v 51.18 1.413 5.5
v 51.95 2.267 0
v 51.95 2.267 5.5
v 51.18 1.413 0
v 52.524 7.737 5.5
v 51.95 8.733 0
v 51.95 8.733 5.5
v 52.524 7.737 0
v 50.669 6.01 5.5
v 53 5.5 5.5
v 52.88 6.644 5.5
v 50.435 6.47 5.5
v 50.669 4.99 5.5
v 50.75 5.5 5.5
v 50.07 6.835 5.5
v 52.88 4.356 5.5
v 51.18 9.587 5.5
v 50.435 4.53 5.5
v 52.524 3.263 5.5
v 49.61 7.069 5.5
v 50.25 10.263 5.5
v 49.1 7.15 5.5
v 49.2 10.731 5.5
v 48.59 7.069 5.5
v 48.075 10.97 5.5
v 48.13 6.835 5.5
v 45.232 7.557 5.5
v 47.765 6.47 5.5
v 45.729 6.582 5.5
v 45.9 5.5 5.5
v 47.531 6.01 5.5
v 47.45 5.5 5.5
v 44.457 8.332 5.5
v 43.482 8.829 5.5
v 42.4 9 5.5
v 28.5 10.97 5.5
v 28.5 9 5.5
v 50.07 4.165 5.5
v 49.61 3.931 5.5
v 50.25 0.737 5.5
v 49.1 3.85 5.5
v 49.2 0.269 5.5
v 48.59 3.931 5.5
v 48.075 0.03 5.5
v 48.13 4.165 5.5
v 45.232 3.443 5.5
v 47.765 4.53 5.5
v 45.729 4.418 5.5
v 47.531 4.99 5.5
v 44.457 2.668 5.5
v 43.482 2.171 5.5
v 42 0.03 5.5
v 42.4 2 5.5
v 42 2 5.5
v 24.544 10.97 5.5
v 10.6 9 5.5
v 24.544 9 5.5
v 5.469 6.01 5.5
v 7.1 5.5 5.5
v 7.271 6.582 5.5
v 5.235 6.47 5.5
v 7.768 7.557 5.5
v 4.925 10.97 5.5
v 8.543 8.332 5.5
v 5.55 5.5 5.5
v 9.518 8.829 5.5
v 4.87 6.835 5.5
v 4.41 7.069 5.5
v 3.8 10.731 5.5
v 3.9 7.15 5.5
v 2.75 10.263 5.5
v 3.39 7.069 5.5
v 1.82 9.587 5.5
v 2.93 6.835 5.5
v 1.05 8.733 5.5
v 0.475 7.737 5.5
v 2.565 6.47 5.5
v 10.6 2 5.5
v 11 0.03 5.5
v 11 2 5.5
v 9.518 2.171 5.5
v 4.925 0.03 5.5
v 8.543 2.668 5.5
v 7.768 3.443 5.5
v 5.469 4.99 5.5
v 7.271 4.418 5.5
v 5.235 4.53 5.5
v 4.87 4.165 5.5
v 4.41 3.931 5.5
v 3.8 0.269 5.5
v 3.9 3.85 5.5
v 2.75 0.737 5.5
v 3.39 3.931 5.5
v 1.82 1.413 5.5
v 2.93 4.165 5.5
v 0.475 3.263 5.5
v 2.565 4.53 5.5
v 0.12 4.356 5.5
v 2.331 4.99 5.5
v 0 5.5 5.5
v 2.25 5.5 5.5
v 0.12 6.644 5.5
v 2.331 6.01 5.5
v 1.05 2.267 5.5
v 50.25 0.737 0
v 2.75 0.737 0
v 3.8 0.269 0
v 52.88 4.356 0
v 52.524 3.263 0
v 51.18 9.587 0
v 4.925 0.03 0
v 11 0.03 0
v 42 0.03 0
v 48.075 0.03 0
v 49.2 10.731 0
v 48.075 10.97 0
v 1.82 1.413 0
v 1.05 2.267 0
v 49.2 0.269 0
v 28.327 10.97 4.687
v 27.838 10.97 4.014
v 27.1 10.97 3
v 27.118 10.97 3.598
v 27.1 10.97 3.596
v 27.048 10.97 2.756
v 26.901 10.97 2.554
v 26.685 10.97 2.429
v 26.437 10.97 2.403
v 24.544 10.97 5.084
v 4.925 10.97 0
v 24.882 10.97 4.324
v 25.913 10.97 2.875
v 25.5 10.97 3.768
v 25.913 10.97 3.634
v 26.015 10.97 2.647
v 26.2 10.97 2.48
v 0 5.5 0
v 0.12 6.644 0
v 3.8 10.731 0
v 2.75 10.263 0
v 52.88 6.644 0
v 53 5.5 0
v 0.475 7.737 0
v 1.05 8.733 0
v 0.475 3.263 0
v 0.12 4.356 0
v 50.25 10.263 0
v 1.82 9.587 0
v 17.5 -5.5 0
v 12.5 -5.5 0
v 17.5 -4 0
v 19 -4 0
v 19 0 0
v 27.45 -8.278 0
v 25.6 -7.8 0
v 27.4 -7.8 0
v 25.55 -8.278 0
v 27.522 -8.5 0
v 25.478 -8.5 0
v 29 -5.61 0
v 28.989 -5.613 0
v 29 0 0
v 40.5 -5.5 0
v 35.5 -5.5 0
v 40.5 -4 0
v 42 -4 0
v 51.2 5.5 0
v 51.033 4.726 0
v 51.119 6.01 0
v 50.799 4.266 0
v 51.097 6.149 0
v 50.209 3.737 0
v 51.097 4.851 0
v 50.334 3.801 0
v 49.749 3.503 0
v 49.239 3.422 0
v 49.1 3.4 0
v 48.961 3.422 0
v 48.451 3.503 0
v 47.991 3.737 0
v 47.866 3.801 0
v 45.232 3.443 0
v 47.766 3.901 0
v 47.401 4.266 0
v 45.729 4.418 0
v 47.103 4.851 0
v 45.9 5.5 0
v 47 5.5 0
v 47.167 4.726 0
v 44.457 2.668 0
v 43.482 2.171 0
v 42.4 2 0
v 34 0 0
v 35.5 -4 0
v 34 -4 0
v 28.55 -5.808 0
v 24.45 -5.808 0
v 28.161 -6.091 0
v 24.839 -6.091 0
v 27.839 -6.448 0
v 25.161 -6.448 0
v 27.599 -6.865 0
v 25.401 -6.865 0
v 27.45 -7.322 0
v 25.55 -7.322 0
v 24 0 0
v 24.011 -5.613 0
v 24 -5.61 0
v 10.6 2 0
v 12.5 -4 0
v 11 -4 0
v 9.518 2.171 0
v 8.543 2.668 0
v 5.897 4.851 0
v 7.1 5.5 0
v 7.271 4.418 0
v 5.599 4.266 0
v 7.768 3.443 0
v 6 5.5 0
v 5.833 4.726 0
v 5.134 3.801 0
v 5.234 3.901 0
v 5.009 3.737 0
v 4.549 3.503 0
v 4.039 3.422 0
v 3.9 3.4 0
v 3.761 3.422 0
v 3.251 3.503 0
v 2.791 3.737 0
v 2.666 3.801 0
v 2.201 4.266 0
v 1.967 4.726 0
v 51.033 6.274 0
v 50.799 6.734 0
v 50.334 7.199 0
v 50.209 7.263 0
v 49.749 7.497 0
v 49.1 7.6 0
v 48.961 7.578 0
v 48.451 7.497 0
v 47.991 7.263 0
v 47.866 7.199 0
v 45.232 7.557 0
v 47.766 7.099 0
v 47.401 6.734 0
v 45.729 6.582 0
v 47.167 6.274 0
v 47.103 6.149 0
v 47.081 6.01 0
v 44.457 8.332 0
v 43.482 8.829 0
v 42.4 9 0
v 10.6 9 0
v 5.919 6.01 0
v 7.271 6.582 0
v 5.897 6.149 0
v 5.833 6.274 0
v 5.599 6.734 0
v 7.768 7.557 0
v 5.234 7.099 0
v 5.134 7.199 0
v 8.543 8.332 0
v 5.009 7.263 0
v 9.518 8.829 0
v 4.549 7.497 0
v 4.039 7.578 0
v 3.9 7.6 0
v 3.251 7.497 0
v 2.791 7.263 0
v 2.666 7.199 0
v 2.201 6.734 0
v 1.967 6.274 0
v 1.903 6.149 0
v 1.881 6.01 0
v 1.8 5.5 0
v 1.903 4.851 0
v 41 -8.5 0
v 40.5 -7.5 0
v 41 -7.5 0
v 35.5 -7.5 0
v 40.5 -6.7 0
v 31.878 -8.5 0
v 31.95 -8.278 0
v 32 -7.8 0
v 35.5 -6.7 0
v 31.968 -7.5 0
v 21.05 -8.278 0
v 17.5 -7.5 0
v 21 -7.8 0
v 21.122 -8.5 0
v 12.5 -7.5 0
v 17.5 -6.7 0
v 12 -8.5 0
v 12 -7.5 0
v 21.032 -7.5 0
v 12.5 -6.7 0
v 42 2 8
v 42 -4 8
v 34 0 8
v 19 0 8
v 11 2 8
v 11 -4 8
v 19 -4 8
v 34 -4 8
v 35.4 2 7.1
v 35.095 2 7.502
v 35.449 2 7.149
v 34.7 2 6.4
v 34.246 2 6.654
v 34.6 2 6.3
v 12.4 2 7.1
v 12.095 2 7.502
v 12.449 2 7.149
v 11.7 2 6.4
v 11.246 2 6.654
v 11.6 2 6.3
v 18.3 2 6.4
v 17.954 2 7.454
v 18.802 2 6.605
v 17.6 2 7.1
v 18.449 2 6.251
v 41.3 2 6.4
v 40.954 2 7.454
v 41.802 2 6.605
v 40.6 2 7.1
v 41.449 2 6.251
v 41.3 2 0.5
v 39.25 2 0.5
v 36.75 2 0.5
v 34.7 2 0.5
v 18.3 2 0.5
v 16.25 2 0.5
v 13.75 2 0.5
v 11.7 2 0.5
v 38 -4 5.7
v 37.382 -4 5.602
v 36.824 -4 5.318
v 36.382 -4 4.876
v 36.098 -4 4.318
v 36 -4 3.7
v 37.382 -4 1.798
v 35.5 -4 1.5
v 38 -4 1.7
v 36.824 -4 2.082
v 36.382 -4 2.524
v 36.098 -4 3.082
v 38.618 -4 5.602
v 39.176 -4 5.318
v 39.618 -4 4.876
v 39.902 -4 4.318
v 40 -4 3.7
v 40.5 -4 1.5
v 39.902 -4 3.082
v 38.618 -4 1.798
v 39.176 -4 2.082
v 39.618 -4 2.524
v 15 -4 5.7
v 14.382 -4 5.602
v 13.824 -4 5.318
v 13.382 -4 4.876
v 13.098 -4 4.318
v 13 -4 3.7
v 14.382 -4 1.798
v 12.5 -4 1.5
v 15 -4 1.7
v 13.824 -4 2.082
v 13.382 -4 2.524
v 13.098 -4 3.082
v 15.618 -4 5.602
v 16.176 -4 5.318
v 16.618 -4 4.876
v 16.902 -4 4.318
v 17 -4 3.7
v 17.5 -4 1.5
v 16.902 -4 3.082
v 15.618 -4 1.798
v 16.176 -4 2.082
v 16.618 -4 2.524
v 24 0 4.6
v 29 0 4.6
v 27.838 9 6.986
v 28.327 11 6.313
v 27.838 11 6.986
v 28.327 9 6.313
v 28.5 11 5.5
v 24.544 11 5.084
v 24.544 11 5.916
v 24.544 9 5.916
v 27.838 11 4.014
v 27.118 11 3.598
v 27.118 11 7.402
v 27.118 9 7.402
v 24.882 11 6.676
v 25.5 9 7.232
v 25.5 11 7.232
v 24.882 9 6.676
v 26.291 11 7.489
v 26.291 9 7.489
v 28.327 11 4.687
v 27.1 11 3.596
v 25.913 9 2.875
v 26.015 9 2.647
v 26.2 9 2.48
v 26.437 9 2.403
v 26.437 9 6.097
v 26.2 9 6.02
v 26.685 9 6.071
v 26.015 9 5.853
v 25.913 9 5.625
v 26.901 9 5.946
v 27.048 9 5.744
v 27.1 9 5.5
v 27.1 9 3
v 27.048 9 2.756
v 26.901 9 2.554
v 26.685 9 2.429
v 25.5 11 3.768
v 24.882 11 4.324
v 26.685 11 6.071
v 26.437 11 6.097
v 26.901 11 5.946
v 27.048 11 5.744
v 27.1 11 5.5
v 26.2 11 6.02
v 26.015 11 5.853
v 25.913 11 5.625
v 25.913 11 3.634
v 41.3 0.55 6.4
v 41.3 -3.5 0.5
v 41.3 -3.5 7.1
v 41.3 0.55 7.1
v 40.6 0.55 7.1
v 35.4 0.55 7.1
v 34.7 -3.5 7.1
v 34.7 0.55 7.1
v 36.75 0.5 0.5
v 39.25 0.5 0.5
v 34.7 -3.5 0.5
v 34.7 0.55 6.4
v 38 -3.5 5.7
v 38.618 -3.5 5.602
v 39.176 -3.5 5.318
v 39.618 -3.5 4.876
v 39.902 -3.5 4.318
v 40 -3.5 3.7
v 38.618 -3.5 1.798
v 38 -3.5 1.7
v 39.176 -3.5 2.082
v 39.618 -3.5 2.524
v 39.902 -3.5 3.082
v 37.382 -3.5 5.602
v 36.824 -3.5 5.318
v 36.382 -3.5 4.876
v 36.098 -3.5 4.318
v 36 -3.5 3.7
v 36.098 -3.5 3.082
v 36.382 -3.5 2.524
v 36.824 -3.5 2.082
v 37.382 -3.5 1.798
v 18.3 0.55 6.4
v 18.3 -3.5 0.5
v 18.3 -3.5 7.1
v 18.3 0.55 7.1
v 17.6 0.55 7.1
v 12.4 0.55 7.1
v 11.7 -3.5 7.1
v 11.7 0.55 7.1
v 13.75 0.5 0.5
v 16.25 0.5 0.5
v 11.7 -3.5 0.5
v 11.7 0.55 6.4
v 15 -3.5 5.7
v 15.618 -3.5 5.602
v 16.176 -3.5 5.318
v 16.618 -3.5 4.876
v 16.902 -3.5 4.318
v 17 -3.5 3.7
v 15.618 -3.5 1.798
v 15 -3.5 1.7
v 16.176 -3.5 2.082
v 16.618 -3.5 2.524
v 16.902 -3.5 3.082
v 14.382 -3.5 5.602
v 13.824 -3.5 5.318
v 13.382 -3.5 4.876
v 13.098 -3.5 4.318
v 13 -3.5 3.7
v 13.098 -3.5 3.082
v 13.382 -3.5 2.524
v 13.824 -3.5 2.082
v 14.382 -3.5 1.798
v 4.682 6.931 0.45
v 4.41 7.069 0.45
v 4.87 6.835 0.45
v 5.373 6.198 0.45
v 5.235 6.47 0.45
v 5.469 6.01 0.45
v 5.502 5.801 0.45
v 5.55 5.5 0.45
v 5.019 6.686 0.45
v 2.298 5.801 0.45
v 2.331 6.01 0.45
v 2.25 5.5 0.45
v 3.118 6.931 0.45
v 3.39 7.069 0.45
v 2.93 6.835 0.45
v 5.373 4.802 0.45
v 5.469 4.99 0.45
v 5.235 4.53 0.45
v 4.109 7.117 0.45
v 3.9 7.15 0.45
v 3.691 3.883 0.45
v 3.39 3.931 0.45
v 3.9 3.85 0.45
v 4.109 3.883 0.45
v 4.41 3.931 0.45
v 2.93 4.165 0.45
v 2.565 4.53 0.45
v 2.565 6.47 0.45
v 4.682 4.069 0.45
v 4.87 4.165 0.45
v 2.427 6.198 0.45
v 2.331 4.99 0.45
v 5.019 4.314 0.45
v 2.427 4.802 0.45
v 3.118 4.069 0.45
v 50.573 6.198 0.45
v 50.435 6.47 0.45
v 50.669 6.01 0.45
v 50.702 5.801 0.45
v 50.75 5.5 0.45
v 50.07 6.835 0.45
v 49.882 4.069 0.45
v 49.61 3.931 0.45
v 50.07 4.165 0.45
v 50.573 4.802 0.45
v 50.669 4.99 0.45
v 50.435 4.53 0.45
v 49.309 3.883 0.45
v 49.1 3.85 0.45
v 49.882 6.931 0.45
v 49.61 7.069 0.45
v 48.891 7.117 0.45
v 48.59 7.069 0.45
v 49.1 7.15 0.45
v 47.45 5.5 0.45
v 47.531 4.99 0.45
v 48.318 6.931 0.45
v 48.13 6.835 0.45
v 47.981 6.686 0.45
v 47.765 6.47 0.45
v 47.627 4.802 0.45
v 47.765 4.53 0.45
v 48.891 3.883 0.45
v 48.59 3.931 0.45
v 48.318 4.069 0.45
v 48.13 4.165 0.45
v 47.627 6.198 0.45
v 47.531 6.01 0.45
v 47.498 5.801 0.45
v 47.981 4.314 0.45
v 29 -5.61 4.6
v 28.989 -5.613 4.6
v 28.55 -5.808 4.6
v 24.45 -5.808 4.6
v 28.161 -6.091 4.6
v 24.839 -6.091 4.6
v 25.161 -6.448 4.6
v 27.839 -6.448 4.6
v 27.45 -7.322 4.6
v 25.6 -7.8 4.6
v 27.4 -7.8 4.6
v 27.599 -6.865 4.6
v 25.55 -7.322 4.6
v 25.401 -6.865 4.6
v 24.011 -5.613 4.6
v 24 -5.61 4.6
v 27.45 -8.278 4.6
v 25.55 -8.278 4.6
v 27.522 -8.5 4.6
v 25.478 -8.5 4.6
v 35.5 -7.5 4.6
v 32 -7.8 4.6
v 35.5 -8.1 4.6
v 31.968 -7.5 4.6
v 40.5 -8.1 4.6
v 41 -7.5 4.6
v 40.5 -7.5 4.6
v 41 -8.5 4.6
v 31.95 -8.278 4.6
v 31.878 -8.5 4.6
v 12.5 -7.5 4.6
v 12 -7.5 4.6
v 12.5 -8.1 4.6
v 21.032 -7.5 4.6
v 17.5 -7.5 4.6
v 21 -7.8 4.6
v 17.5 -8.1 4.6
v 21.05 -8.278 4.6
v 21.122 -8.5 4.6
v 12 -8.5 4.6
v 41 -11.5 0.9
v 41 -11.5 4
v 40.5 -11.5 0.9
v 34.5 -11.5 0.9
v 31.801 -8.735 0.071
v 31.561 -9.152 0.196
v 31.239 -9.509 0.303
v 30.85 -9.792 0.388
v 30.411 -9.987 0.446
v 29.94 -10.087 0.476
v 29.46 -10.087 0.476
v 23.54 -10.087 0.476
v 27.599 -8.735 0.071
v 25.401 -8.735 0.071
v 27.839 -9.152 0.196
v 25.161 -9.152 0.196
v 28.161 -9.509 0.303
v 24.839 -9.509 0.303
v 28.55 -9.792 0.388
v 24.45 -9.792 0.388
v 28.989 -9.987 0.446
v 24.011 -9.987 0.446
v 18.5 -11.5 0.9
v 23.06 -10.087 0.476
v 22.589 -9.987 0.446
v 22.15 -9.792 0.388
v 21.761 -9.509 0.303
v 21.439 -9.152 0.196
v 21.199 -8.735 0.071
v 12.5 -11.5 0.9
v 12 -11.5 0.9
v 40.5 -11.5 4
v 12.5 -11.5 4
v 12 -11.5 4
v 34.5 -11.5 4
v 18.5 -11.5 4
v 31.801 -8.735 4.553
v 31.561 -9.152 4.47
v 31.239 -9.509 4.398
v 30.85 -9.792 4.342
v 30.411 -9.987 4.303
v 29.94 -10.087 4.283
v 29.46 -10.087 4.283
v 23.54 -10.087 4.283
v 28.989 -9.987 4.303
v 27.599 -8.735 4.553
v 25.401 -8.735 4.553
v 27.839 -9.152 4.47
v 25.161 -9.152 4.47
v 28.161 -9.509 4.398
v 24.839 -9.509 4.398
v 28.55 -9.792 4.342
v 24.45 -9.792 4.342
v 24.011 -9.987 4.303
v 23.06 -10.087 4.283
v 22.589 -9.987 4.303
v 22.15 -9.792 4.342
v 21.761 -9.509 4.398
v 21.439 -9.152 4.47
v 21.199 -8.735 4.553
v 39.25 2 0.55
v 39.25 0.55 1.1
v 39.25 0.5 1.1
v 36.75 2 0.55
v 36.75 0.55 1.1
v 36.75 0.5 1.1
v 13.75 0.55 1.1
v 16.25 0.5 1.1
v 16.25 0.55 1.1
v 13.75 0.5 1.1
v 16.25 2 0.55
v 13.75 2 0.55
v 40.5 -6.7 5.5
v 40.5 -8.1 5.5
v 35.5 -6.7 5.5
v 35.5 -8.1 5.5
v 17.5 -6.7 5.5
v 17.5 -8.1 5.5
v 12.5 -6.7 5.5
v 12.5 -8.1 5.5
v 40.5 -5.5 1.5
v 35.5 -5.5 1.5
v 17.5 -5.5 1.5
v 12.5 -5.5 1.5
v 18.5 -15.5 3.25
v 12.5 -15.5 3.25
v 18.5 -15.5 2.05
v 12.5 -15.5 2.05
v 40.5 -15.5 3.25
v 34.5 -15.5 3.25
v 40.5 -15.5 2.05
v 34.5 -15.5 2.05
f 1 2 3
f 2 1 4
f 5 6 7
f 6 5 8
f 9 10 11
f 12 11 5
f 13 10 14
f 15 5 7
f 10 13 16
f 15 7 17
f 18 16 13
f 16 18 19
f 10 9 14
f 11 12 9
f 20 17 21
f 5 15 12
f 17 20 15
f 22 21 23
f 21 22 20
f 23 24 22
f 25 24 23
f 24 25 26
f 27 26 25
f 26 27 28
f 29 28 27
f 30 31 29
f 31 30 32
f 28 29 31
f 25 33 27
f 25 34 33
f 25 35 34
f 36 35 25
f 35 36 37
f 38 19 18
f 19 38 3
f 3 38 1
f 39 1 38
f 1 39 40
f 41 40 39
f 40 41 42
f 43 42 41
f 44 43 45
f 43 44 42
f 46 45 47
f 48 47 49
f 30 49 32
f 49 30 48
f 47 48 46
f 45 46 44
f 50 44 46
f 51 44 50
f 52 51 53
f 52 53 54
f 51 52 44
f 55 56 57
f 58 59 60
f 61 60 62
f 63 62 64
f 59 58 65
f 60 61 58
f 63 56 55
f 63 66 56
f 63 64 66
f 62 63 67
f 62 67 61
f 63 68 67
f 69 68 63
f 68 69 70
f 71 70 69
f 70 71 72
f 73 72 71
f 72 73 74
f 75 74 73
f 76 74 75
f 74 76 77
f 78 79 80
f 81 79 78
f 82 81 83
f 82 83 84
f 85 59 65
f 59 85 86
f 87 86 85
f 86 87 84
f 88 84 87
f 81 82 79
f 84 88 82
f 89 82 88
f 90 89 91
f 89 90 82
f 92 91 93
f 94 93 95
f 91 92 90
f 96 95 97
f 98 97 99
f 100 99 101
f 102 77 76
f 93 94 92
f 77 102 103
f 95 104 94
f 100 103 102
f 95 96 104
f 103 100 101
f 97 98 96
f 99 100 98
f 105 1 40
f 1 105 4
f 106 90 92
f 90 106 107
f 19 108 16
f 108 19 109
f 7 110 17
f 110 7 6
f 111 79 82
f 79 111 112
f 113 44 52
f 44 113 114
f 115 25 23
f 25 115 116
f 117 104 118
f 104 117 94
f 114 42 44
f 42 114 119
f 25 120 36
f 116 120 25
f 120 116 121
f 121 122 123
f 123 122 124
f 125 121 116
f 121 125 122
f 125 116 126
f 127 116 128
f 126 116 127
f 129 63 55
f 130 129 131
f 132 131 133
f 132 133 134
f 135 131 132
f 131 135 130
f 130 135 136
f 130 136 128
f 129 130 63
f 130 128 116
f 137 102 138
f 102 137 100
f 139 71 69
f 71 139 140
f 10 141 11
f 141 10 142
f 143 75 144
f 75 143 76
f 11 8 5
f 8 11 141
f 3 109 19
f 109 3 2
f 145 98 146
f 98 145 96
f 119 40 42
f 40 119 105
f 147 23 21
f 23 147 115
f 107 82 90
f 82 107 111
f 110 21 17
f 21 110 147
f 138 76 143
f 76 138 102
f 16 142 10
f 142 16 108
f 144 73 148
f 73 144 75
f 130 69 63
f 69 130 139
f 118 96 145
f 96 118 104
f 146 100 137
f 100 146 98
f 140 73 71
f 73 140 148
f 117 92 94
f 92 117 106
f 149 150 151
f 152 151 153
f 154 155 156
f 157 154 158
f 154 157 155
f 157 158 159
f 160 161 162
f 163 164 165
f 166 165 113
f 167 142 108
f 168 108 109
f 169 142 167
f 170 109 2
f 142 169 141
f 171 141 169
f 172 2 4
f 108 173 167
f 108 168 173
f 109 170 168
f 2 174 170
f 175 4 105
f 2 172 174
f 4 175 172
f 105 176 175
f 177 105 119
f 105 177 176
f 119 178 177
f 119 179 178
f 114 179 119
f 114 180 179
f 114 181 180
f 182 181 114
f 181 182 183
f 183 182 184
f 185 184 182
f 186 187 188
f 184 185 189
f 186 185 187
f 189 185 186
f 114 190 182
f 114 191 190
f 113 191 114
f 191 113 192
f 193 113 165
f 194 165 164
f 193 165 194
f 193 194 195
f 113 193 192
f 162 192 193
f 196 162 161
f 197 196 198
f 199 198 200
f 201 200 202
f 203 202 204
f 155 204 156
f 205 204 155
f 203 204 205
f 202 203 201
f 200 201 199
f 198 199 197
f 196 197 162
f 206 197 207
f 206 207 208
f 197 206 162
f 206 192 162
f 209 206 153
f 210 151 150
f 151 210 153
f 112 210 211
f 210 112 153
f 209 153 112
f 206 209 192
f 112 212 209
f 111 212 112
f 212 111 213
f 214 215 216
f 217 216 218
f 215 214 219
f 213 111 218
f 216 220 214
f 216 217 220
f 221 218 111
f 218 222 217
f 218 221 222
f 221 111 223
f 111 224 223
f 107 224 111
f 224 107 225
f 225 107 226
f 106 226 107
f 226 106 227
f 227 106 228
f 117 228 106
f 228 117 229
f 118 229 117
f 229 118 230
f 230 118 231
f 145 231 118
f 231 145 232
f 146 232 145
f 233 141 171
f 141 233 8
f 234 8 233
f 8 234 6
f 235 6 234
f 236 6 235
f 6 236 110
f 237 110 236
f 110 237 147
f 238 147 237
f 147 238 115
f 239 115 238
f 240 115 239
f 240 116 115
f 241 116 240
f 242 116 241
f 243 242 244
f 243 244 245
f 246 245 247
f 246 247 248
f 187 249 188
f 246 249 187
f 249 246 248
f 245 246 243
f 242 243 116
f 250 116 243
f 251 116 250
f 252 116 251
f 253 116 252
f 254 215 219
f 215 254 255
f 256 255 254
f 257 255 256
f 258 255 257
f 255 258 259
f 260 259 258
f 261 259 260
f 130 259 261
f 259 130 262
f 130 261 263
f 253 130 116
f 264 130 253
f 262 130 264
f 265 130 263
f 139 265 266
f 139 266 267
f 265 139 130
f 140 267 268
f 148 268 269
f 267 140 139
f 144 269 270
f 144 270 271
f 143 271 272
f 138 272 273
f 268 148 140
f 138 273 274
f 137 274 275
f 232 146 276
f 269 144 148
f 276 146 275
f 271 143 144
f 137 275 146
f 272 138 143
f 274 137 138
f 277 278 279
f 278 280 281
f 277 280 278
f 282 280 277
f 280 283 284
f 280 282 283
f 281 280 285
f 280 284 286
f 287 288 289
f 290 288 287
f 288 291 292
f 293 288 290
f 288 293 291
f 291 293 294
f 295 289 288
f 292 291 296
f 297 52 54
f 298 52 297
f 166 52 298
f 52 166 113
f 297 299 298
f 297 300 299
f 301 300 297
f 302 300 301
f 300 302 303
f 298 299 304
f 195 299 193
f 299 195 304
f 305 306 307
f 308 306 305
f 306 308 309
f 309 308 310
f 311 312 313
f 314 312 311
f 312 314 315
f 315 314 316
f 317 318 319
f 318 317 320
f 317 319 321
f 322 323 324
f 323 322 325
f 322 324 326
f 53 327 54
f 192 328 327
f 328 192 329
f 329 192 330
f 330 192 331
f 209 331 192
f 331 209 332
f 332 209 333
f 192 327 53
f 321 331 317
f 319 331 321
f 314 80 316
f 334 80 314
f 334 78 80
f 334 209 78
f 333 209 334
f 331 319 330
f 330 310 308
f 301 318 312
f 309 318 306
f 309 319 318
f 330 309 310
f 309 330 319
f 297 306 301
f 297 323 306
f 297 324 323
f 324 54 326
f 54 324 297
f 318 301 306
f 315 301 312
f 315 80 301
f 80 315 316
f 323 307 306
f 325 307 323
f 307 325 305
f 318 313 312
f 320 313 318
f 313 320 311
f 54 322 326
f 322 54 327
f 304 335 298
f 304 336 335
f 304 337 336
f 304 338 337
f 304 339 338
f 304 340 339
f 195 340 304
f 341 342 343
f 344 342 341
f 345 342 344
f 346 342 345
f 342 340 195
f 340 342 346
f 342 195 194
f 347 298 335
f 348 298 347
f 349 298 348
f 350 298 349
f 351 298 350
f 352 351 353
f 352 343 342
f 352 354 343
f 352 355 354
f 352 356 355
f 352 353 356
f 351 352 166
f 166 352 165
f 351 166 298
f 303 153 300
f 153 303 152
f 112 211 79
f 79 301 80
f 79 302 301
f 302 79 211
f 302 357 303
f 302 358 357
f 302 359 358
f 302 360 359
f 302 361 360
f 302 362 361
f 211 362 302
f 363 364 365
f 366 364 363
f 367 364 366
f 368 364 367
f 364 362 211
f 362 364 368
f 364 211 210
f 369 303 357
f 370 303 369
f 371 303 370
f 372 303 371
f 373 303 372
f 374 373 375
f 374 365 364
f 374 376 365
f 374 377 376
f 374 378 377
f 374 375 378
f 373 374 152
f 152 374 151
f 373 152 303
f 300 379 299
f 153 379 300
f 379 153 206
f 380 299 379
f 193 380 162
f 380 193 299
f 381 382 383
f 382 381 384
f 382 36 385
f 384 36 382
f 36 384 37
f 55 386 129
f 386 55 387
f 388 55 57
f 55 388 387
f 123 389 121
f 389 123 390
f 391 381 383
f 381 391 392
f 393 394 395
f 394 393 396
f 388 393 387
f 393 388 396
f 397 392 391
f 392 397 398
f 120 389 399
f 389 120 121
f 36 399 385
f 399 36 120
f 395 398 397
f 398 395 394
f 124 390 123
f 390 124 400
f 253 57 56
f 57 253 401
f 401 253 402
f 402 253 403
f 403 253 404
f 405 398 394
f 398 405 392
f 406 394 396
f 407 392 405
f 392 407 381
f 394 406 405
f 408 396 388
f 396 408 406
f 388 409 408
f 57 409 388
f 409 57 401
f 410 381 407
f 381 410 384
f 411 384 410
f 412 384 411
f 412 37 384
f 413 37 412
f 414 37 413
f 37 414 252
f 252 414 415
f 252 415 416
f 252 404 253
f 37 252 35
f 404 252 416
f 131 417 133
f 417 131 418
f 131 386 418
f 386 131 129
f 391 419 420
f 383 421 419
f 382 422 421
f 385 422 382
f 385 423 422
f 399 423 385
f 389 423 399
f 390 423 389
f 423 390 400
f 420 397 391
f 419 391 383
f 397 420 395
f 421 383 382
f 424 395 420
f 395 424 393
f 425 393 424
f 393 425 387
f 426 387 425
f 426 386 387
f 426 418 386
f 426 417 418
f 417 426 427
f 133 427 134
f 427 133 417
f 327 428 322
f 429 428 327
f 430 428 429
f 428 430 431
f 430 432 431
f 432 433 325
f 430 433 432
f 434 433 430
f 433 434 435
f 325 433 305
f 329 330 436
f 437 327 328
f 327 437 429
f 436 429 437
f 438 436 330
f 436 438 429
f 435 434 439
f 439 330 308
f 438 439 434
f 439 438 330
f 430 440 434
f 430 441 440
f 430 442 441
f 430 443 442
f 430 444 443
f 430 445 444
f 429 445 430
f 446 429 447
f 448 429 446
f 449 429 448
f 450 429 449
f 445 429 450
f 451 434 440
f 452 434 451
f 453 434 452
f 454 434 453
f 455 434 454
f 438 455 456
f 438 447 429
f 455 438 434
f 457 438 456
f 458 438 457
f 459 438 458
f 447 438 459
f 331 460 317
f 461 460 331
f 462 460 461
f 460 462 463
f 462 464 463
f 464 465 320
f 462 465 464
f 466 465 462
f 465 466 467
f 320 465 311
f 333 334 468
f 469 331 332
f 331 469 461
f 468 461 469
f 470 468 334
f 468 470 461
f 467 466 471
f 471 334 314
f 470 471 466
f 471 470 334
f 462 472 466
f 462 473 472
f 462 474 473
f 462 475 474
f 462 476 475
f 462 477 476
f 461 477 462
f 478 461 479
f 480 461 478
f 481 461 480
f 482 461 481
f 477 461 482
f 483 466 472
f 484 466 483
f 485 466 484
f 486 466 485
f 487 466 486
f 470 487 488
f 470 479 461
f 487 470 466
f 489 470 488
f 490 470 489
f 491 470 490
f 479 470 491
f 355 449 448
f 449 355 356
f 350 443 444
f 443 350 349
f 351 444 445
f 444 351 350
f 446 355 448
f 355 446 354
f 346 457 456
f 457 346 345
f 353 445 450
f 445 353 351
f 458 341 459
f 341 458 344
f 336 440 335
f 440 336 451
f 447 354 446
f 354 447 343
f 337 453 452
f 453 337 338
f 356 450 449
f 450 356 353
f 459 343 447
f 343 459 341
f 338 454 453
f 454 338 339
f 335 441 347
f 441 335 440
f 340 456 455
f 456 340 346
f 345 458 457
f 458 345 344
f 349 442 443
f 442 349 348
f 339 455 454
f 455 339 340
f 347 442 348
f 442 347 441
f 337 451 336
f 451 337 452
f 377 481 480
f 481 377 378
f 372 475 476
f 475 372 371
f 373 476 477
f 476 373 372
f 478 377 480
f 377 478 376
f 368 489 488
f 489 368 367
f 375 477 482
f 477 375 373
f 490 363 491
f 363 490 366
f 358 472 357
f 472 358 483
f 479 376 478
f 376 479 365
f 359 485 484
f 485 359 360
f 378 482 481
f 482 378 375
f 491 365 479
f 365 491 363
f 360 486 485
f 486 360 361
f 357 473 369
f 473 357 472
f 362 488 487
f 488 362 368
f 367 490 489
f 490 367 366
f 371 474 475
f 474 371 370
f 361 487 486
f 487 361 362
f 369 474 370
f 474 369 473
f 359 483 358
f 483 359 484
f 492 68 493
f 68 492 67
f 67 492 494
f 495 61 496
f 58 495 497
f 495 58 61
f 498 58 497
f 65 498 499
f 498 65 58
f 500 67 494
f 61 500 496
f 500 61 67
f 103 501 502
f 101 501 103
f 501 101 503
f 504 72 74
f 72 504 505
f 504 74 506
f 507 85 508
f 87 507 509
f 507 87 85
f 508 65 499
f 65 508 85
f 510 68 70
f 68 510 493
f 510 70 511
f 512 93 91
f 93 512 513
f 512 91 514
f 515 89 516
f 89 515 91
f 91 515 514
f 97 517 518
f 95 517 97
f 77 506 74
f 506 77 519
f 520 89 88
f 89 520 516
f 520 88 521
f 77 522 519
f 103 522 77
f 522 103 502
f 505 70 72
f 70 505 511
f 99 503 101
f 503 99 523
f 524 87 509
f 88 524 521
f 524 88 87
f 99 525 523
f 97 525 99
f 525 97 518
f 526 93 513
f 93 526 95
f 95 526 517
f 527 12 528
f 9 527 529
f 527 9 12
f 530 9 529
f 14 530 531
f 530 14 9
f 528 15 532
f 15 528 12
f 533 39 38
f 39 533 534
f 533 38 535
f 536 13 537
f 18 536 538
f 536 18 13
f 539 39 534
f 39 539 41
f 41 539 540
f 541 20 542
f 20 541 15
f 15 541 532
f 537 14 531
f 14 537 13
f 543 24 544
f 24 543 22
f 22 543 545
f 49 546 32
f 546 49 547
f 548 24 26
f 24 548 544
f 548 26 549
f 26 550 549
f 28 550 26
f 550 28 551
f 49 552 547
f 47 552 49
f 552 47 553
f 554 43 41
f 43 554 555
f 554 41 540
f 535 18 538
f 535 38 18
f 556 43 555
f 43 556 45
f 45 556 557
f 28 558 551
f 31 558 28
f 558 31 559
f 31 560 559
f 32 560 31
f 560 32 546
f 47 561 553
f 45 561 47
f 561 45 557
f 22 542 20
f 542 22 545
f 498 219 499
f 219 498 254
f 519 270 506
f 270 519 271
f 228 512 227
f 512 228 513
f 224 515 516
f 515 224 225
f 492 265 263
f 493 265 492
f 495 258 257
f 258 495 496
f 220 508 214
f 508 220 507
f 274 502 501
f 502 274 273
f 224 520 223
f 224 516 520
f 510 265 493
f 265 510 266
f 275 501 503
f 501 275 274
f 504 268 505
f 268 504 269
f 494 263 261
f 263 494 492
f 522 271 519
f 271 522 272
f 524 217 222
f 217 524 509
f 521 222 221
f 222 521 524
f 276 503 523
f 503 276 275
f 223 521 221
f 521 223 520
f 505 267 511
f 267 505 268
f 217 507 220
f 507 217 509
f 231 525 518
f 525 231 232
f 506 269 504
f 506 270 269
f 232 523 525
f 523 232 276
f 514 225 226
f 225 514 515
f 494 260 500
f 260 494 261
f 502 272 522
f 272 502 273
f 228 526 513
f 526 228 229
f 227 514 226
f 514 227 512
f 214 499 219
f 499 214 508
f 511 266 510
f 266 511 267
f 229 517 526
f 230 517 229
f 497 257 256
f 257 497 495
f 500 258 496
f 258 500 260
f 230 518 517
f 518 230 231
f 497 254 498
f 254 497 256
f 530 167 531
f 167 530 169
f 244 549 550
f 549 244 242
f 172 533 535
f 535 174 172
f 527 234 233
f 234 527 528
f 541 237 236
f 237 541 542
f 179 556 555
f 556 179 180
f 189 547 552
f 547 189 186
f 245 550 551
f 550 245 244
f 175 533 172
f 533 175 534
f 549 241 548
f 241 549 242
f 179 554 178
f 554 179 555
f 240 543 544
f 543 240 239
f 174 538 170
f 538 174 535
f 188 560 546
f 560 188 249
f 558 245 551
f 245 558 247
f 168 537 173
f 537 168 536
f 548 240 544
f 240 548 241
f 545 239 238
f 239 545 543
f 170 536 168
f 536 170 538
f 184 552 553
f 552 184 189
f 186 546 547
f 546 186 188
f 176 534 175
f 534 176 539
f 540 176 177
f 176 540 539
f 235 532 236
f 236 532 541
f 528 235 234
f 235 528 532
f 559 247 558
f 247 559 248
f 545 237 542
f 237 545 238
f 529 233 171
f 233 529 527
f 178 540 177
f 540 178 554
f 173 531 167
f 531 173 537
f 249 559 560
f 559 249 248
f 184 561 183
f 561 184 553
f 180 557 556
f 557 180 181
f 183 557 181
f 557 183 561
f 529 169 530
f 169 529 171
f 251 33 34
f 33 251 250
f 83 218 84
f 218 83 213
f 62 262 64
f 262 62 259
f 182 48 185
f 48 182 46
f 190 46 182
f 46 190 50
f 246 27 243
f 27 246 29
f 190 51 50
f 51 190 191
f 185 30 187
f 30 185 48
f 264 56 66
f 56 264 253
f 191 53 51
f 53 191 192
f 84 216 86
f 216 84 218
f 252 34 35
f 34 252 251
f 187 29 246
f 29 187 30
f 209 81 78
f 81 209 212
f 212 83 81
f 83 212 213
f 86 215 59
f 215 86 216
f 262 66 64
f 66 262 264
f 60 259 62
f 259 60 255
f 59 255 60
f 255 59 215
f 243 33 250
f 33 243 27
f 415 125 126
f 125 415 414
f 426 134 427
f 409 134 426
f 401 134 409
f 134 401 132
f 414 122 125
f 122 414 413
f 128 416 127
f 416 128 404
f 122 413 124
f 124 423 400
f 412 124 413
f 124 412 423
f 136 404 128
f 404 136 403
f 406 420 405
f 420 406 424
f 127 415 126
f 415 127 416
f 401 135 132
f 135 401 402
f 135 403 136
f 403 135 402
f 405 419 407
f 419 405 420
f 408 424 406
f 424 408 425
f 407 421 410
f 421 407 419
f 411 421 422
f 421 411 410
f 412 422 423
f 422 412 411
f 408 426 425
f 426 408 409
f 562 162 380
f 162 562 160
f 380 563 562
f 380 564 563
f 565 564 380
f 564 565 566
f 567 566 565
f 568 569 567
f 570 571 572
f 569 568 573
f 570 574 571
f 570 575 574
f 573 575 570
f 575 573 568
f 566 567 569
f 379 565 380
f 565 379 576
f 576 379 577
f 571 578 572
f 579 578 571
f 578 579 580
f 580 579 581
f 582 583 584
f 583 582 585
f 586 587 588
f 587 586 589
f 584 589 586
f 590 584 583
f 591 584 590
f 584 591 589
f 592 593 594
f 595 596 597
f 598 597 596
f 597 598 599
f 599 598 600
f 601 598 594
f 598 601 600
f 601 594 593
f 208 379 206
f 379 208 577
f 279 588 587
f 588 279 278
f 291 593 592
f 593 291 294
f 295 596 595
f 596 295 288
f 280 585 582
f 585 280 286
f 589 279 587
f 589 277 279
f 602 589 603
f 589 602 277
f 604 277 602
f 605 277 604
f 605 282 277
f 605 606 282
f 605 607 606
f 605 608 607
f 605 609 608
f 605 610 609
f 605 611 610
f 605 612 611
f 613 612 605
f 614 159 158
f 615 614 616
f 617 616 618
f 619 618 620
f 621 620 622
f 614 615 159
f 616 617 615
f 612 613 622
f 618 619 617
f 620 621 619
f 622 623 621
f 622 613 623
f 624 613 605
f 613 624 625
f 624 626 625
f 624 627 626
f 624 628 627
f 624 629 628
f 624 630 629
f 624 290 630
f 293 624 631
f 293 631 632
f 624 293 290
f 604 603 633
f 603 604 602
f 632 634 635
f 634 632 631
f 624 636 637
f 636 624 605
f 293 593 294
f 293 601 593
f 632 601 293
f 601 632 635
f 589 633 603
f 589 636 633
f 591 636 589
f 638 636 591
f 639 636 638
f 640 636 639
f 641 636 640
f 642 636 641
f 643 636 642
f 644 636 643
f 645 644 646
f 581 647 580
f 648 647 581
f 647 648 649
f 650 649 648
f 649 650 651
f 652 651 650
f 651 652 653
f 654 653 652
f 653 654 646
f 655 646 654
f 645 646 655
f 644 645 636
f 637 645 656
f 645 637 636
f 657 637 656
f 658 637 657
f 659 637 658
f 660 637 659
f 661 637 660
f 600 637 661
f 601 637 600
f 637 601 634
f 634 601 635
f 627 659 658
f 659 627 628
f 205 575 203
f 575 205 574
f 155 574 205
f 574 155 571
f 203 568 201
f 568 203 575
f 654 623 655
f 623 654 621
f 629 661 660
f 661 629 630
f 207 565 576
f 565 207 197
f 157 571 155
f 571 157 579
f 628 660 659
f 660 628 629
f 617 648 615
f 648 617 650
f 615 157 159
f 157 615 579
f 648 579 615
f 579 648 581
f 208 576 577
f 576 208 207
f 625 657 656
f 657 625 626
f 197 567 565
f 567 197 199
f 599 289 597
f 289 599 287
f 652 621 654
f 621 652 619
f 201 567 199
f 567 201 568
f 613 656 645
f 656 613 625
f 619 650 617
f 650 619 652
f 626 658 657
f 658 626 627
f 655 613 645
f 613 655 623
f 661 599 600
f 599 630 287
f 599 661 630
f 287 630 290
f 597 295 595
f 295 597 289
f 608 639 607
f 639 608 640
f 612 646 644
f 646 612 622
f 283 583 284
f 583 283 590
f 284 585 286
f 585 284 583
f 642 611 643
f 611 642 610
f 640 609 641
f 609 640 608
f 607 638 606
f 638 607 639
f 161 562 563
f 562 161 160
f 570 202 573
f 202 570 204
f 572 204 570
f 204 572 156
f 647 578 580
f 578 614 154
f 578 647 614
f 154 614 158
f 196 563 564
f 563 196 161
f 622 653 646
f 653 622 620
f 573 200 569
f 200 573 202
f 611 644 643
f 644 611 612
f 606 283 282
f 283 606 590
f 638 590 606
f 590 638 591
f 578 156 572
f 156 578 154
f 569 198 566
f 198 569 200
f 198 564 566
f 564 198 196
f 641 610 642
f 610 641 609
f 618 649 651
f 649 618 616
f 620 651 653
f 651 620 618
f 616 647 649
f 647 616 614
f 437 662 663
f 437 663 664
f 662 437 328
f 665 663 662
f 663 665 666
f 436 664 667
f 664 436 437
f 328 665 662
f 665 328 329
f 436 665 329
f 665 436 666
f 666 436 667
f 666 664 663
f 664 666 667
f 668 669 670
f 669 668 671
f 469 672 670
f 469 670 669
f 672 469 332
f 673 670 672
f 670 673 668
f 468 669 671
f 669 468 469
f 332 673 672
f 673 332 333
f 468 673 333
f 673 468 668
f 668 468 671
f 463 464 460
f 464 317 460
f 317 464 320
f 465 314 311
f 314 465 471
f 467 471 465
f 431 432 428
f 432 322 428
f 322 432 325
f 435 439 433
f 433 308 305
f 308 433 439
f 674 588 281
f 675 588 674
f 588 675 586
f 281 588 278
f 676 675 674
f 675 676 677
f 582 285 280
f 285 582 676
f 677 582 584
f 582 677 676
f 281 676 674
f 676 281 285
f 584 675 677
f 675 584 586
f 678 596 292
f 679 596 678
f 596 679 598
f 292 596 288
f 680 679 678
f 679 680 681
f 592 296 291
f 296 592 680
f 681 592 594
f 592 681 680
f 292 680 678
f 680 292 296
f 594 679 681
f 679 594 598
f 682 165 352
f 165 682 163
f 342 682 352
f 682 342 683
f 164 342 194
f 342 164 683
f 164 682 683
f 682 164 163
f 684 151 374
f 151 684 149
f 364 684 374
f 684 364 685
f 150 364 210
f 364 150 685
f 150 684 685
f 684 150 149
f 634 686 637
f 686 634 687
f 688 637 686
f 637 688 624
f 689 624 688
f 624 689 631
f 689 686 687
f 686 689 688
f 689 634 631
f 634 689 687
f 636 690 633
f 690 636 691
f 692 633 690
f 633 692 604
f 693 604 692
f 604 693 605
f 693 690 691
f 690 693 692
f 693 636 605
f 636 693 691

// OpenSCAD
//**************************************************
//*  Trim button block to retrofit into MPX Profi transmitter gimbal 
//*  28.11.2014 Henning Stoecklein - free for noncemmercial use
//**************************************************

// Show ghost objects?
ghost = 0 ; // [0:No ghosts, 1:Show additional objects]

// Make cable holder?
cable_holder = 1 ; // [0:No holder, 1:Make cable holder hole]

// Basic gimbal adapter dimension X
blx = 53 ;

// Basic gimbal adapter dimension Y
blh = 5.5;

// Trim lever button knob width
trimx = 6; // [4:8]

// Trim lever button knob height
knob_height = 1.2 ;

// Trim button travel restriction block height
travel = 5.5 ;

// Trim lever height (don't change)
trimy = 8.5;

// Microswitch fixation snap height
snap_height = 0.6 ;

// Cutout radius for integrated lever hinge (2.2 = hard, 2.6 = soft)
hinge_cutout = 2.3;

stegx = 29 ;
bspc  = 6.6 ;

// Trimmerblock
module 9xr_trimmer()
{
	// Basisblock
   difference() {
     union()
     {
		 hull() {
		   translate ([5.5,5.5,0]) cylinder (r=5.5, h=blh, $fn=30) ;
		   translate ([blx-5.5,5.5,0]) cylinder (r=5.5, h=blh, $fn=30) ;
		 }

        // Fixing blocks for Micro switches
        translate ([38-8/2,-4,0]) cube ([8, 6, 8]);
        translate ([15-8/2,-4,0]) cube ([8, 6, 8]);
        
         // Bar in between
        translate ([(blx-30)/2,0,0]) cube ([30, 2, 8]);
         
        // Cable holder
        if (cable_holder == 1)
           translate ([blx/2,11,blh]) rotate ([90,0,0]) cylinder (r=2, h=2, $fn=15);
     }

	  // 4-edge-holes and holes for micro switch
     translate ([38-bspc/2,-3.5,0.5]) cube ([bspc, 8, bspc]);
     translate ([15-bspc/2,-3.5,0.5]) cube ([bspc, 8, bspc]);
     translate ([38,4,3.7]) rotate ([90,0,0]) cylinder (r=2, h=10, $fn=20);
     translate ([15,4,3.7]) rotate ([90,0,0]) cylinder (r=2, h=10, $fn=20);

	  // Screw holes
     translate ([(blx-45.2)/2,5.5,-0.1]) cylinder (r=3.3/2, h=6, $fn=20) ;
     translate ([(blx-45.2)/2+45.2,5.5,-0.1]) cylinder (r=3.3/2, h=6, $fn=20);

	  // Chamfers 
     translate ([(blx-45.2)/2,5.5,-0.9]) cylinder (r1=3, r2=1, h=2, $fn=20);
     translate ([(blx-45.2)/2+45.2,5.5,-0.9]) cylinder (r1=3, r2=1, h=2, $fn=20);
		
	  // Big long hole 
     hull() 
     {
       translate ([blx*0.2,5.5,-0.1]) cylinder (r=3.5, h=10, $fn=20);
       translate ([blx*0.8,5.5,-0.1]) cylinder (r=3.5, h=10, $fn=20);
     }

     // Hole in cable holder if required 
     if (cable_holder ==1) 
        hull() 
        {
	       translate ([blx/2,12,blh]) rotate ([90,0,0]) cylinder (r=0.6, h=4, $fn=15);
	       translate ([blx/2,12,blh-2.5]) rotate ([90,0,0]) cylinder (r=0.6, h=4, $fn=15);
	     }
   }
 
   // Ramp clips for Snap-in switch fixation
   hull() {
	  translate ([38-2.5/2,0.5,0.5]) cube ([2.5, 0.05, snap_height]);
	  translate ([38-2.5/2,1.95,0.5]) cube ([2.5, 0.05, 0.05]);
   }
   hull() {
	  translate ([15-2.5/2,0.5,0.5]) cube ([2.5, 0.05, snap_height]);
	  translate ([15-2.5/2,1.95,0.5]) cube ([2.5, 0.05, 0.05]);
   }

	// Clips for switch fixation
   translate ([15+2.6,0.55,bspc+0.5]) rotate ([0,45,0]) cube ([1.2, 1.45, 0.5]);
   translate ([15+3.2-bspc,0.55,bspc-0.3]) rotate ([0,-45,0]) #cube ([1.2, 1.45, 0.5]);
   translate ([38+2.6,0.55,bspc+0.5]) rotate ([0,45,0]) #cube ([1.2, 1.45, 0.5]);
   translate ([38+3.2-bspc,0.55,bspc-0.3]) rotate ([0,-45,0]) #cube ([1.2, 1.45, 0.5]);
 
	// Operation Lever
   translate ([38-5/2,-8.1,0]) cube ([5, 1.4, 5.5]) ;
   translate ([15-5/2,-8.1,0]) cube ([5, 1.4, 5.5]) ;

 	// End block to constrain lever travel
   translate ([38-5/2,-travel,0]) cube ([5, 1.5, 1.5]) ;
   translate ([15-5/2,-travel,0]) cube ([5, 1.5, 1.5]) ;

   // Hole for hinge
   difference() 
   {
     union() {
       translate ([(blx-5)/2,-8,0]) cube ([5, 8, 4.6]) ;		// Hinge block

       // Connecting rod between 2 trim switches
       hull() {
			translate ([(blx-stegx)/2,-trimy,0]) cube ([stegx, 1, 4.6]) ;
     		translate ([(blx-stegx)/2,-trimy-3,0.9]) cube ([stegx, 0.5, 3.1]) ;
		 }
     }
 
     translate ([blx/2-3.2,-7.8,-0.1]) cylinder (r=hinge_cutout, h=10, $fn=30);
     translate ([blx/2+3.2,-7.8,-0.1]) cylinder (r=hinge_cutout, h=10, $fn=30);
   }

   // Trim button (Prism)
   hull() {
     translate ([1+(blx-30)/2,-trimy-3,(blh-3.7)/2]) cube ([trimx, 0.1, 3.1]) ;
     translate ([1+(blx-30)/2,-trimy-7,(blh-1.4)/2]) cube ([trimx, 0.1, knob_height]) ;
   }
   hull() {
     translate ([(blx-30)/2+29-trimx,-trimy-3,(blh-3.7)/2]) cube ([trimx, 1, 3.1]) ;
     translate ([(blx-30)/2+29-trimx,-trimy-7,(blh-1.4)/2]) cube ([trimx, 1, knob_height]) ;
   }
}

module smd_taster()
{
   cube ([5, 5, 1.2], center=true) ;
   translate ([0,0,0.2]) cylinder (r=1, h=1.5, $fn=20, center=true) ;
}

module taster()
{
   cube ([6.2, 6.2, 3.5], center=true) ;
   translate ([0,0,1.6]) cylinder (r=3.4/2, h=6.7, $fn=20, center=true) ;
}

9xr_trimmer() ;

if (ghost == 1)
{
  rotate ([90,0,0]) translate ([(blx-23)/2-0,3.5]) %taster() ;
  rotate ([90,0,0]) translate ([(blx+23)/2+0,3.5]) %taster() ;
}
